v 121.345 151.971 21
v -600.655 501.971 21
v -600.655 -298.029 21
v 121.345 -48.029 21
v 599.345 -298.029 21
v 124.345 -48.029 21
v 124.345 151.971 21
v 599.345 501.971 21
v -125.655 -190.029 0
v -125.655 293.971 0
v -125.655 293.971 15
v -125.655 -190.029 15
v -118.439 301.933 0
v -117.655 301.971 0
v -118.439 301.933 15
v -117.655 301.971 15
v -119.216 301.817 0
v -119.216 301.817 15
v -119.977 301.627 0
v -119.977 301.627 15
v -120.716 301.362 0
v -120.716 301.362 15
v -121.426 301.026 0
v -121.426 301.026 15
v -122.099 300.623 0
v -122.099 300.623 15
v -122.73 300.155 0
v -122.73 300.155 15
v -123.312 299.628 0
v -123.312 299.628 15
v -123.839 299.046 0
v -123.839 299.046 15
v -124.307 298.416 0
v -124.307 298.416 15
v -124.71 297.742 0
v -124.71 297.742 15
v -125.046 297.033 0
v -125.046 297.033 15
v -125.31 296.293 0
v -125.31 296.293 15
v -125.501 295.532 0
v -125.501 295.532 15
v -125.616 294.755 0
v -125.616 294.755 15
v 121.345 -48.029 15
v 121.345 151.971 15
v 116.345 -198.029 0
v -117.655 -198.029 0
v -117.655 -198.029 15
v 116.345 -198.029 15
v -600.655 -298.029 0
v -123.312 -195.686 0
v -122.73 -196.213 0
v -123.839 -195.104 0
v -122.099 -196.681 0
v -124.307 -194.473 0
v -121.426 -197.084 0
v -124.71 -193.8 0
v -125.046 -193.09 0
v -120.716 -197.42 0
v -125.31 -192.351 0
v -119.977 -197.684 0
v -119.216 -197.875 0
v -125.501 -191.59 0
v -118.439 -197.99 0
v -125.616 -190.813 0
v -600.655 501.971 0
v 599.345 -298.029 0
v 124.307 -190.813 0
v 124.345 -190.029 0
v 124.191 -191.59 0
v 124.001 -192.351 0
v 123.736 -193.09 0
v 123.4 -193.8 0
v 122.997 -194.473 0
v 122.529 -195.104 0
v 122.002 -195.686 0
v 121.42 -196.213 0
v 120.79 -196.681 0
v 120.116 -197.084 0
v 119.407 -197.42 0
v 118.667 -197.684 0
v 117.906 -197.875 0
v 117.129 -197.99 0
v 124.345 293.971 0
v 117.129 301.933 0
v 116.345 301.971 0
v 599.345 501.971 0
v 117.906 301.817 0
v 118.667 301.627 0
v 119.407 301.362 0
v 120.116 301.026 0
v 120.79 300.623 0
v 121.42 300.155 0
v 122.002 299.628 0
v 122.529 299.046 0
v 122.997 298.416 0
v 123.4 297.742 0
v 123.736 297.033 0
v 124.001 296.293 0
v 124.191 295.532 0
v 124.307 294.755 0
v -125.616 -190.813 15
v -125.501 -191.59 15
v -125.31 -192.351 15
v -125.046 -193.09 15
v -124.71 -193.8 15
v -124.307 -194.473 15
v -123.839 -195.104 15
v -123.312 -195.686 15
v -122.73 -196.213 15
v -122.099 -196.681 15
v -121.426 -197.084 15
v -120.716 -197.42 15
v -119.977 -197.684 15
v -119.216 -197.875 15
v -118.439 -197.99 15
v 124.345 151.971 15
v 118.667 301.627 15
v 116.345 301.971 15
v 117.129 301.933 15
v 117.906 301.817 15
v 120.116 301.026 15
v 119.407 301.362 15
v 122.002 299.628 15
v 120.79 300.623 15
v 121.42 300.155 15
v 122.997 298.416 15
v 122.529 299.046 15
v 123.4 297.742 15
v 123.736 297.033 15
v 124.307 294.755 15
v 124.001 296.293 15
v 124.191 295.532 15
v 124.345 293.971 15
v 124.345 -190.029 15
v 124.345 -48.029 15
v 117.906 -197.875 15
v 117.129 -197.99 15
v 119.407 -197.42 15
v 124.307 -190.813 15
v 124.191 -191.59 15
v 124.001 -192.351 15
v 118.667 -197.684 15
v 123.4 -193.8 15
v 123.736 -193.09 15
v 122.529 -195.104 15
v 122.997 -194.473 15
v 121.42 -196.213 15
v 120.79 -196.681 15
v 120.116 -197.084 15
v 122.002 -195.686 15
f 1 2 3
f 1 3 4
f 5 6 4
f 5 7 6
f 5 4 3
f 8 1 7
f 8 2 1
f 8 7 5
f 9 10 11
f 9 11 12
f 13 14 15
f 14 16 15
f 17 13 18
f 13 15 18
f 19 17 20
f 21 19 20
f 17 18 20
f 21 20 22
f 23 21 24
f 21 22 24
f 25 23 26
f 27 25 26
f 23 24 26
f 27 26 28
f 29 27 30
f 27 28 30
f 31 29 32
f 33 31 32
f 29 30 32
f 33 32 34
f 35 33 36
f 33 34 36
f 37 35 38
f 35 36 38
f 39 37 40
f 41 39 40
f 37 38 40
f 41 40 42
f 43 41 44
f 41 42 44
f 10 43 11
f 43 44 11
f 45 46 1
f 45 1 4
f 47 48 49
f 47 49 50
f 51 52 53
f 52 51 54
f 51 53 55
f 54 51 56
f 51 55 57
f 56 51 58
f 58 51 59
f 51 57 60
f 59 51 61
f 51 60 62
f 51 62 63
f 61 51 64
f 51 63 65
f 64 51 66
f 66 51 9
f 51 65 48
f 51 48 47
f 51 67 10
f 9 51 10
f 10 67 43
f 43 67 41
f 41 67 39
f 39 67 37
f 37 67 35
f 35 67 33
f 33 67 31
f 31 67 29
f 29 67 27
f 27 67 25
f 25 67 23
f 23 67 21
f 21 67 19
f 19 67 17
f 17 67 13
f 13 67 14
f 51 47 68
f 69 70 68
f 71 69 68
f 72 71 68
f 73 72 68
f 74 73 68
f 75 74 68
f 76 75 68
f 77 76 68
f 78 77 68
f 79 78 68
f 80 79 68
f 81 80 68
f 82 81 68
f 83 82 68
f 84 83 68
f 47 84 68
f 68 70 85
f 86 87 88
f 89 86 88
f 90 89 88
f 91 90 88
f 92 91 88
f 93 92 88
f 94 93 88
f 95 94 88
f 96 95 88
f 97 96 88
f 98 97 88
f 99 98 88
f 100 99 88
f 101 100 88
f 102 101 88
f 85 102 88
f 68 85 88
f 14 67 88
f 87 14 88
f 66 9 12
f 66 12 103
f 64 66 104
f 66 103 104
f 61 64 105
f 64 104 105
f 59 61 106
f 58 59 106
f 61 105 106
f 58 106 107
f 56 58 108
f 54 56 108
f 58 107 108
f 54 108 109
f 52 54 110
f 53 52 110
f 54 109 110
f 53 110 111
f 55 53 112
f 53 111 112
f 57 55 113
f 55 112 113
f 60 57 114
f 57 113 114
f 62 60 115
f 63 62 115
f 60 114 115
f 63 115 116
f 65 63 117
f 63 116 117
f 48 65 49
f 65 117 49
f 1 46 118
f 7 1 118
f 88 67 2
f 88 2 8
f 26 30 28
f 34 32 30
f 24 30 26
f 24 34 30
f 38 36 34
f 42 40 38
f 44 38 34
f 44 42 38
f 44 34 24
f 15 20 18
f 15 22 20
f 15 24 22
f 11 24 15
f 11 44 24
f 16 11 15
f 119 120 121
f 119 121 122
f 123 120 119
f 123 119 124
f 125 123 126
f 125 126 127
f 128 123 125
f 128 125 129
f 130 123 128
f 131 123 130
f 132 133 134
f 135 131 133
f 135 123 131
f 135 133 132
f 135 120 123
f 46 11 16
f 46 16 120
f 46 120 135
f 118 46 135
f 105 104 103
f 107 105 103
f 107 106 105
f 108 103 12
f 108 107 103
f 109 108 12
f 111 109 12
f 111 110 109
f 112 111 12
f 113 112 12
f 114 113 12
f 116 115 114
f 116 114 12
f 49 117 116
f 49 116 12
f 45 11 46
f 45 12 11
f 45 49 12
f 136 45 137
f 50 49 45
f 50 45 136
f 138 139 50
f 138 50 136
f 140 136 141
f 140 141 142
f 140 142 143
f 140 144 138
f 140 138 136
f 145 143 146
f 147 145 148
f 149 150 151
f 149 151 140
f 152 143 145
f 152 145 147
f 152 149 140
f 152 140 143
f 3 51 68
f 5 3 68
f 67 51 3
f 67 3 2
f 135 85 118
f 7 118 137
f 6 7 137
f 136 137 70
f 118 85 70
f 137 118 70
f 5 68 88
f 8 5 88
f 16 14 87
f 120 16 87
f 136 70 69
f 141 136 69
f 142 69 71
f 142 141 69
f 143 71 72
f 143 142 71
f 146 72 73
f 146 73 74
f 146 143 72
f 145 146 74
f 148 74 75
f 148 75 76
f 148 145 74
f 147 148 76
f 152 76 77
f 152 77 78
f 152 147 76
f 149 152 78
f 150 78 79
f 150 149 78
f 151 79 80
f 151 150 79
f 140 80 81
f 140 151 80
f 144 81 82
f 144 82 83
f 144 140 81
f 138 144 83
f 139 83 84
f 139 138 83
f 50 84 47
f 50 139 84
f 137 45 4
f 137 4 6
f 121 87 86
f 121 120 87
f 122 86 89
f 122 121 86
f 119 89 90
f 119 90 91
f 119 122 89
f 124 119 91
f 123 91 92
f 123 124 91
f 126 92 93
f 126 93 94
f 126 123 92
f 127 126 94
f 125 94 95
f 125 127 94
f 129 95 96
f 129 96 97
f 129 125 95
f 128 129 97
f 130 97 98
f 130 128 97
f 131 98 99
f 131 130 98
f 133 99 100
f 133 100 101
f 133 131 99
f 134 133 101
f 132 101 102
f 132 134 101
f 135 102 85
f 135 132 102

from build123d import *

# Parameters (mm, degrees)
F0_W     = 1200
F0_H     = 800
F1_DEPTH = 21
F2_W     = 250
F2_H     = 500
F3_DEPTH = 15
F4_R     = 8
F5_R     = 8
F6_R     = 8
F7_R     = 8
F8_W     = 3
F8_H     = 200
F9_DEPTH = 25


with BuildPart() as f1:
    # F0 (on Top) → F1 (new body)
    with BuildSketch(Plane.XY):
        with Locations((-0.654887, 101.971073)):
            Rectangle(F0_W, F0_H)
    extrude(amount=F1_DEPTH)

    # F2 (on face) → F3 (cut)
    with BuildSketch(Plane(origin=(0, 0, 0), x_dir=(1, 0, 0), z_dir=(0, 0, -1))):
        with Locations((-0.654887, -51.971073)):
            Rectangle(F2_W, F2_H)
    extrude(amount=-F3_DEPTH, mode=Mode.SUBTRACT)

    # F4
    f4_edges = [f1.edges().sort_by_distance(p)[0] for p in [
        (-125.654887, -198.028927, 7.5),
    ]]
    fillet(f4_edges, radius=F4_R)

    # F5
    f5_edges = [f1.edges().sort_by_distance(p)[0] for p in [
        (124.345113, 301.971073, 7.5),
    ]]
    fillet(f5_edges, radius=F5_R)

    # F6
    f6_edges = [f1.edges().sort_by_distance(p)[0] for p in [
        (124.345113, -198.028927, 7.5),
    ]]
    fillet(f6_edges, radius=F6_R)

    # F7
    f7_edges = [f1.edges().sort_by_distance(p)[0] for p in [
        (-125.654887, 301.971073, 7.5),
    ]]
    fillet(f7_edges, radius=F7_R)

    # F8 (on face) → F9 (cut)
    with BuildSketch(Plane(origin=(0, 0, 15), x_dir=(1, 0, 0), z_dir=(0, 0, -1))):
        with Locations((122.845113, -51.971073)):
            Rectangle(F8_W, F8_H)
    extrude(amount=-F9_DEPTH, mode=Mode.SUBTRACT)


solid = f1.part
